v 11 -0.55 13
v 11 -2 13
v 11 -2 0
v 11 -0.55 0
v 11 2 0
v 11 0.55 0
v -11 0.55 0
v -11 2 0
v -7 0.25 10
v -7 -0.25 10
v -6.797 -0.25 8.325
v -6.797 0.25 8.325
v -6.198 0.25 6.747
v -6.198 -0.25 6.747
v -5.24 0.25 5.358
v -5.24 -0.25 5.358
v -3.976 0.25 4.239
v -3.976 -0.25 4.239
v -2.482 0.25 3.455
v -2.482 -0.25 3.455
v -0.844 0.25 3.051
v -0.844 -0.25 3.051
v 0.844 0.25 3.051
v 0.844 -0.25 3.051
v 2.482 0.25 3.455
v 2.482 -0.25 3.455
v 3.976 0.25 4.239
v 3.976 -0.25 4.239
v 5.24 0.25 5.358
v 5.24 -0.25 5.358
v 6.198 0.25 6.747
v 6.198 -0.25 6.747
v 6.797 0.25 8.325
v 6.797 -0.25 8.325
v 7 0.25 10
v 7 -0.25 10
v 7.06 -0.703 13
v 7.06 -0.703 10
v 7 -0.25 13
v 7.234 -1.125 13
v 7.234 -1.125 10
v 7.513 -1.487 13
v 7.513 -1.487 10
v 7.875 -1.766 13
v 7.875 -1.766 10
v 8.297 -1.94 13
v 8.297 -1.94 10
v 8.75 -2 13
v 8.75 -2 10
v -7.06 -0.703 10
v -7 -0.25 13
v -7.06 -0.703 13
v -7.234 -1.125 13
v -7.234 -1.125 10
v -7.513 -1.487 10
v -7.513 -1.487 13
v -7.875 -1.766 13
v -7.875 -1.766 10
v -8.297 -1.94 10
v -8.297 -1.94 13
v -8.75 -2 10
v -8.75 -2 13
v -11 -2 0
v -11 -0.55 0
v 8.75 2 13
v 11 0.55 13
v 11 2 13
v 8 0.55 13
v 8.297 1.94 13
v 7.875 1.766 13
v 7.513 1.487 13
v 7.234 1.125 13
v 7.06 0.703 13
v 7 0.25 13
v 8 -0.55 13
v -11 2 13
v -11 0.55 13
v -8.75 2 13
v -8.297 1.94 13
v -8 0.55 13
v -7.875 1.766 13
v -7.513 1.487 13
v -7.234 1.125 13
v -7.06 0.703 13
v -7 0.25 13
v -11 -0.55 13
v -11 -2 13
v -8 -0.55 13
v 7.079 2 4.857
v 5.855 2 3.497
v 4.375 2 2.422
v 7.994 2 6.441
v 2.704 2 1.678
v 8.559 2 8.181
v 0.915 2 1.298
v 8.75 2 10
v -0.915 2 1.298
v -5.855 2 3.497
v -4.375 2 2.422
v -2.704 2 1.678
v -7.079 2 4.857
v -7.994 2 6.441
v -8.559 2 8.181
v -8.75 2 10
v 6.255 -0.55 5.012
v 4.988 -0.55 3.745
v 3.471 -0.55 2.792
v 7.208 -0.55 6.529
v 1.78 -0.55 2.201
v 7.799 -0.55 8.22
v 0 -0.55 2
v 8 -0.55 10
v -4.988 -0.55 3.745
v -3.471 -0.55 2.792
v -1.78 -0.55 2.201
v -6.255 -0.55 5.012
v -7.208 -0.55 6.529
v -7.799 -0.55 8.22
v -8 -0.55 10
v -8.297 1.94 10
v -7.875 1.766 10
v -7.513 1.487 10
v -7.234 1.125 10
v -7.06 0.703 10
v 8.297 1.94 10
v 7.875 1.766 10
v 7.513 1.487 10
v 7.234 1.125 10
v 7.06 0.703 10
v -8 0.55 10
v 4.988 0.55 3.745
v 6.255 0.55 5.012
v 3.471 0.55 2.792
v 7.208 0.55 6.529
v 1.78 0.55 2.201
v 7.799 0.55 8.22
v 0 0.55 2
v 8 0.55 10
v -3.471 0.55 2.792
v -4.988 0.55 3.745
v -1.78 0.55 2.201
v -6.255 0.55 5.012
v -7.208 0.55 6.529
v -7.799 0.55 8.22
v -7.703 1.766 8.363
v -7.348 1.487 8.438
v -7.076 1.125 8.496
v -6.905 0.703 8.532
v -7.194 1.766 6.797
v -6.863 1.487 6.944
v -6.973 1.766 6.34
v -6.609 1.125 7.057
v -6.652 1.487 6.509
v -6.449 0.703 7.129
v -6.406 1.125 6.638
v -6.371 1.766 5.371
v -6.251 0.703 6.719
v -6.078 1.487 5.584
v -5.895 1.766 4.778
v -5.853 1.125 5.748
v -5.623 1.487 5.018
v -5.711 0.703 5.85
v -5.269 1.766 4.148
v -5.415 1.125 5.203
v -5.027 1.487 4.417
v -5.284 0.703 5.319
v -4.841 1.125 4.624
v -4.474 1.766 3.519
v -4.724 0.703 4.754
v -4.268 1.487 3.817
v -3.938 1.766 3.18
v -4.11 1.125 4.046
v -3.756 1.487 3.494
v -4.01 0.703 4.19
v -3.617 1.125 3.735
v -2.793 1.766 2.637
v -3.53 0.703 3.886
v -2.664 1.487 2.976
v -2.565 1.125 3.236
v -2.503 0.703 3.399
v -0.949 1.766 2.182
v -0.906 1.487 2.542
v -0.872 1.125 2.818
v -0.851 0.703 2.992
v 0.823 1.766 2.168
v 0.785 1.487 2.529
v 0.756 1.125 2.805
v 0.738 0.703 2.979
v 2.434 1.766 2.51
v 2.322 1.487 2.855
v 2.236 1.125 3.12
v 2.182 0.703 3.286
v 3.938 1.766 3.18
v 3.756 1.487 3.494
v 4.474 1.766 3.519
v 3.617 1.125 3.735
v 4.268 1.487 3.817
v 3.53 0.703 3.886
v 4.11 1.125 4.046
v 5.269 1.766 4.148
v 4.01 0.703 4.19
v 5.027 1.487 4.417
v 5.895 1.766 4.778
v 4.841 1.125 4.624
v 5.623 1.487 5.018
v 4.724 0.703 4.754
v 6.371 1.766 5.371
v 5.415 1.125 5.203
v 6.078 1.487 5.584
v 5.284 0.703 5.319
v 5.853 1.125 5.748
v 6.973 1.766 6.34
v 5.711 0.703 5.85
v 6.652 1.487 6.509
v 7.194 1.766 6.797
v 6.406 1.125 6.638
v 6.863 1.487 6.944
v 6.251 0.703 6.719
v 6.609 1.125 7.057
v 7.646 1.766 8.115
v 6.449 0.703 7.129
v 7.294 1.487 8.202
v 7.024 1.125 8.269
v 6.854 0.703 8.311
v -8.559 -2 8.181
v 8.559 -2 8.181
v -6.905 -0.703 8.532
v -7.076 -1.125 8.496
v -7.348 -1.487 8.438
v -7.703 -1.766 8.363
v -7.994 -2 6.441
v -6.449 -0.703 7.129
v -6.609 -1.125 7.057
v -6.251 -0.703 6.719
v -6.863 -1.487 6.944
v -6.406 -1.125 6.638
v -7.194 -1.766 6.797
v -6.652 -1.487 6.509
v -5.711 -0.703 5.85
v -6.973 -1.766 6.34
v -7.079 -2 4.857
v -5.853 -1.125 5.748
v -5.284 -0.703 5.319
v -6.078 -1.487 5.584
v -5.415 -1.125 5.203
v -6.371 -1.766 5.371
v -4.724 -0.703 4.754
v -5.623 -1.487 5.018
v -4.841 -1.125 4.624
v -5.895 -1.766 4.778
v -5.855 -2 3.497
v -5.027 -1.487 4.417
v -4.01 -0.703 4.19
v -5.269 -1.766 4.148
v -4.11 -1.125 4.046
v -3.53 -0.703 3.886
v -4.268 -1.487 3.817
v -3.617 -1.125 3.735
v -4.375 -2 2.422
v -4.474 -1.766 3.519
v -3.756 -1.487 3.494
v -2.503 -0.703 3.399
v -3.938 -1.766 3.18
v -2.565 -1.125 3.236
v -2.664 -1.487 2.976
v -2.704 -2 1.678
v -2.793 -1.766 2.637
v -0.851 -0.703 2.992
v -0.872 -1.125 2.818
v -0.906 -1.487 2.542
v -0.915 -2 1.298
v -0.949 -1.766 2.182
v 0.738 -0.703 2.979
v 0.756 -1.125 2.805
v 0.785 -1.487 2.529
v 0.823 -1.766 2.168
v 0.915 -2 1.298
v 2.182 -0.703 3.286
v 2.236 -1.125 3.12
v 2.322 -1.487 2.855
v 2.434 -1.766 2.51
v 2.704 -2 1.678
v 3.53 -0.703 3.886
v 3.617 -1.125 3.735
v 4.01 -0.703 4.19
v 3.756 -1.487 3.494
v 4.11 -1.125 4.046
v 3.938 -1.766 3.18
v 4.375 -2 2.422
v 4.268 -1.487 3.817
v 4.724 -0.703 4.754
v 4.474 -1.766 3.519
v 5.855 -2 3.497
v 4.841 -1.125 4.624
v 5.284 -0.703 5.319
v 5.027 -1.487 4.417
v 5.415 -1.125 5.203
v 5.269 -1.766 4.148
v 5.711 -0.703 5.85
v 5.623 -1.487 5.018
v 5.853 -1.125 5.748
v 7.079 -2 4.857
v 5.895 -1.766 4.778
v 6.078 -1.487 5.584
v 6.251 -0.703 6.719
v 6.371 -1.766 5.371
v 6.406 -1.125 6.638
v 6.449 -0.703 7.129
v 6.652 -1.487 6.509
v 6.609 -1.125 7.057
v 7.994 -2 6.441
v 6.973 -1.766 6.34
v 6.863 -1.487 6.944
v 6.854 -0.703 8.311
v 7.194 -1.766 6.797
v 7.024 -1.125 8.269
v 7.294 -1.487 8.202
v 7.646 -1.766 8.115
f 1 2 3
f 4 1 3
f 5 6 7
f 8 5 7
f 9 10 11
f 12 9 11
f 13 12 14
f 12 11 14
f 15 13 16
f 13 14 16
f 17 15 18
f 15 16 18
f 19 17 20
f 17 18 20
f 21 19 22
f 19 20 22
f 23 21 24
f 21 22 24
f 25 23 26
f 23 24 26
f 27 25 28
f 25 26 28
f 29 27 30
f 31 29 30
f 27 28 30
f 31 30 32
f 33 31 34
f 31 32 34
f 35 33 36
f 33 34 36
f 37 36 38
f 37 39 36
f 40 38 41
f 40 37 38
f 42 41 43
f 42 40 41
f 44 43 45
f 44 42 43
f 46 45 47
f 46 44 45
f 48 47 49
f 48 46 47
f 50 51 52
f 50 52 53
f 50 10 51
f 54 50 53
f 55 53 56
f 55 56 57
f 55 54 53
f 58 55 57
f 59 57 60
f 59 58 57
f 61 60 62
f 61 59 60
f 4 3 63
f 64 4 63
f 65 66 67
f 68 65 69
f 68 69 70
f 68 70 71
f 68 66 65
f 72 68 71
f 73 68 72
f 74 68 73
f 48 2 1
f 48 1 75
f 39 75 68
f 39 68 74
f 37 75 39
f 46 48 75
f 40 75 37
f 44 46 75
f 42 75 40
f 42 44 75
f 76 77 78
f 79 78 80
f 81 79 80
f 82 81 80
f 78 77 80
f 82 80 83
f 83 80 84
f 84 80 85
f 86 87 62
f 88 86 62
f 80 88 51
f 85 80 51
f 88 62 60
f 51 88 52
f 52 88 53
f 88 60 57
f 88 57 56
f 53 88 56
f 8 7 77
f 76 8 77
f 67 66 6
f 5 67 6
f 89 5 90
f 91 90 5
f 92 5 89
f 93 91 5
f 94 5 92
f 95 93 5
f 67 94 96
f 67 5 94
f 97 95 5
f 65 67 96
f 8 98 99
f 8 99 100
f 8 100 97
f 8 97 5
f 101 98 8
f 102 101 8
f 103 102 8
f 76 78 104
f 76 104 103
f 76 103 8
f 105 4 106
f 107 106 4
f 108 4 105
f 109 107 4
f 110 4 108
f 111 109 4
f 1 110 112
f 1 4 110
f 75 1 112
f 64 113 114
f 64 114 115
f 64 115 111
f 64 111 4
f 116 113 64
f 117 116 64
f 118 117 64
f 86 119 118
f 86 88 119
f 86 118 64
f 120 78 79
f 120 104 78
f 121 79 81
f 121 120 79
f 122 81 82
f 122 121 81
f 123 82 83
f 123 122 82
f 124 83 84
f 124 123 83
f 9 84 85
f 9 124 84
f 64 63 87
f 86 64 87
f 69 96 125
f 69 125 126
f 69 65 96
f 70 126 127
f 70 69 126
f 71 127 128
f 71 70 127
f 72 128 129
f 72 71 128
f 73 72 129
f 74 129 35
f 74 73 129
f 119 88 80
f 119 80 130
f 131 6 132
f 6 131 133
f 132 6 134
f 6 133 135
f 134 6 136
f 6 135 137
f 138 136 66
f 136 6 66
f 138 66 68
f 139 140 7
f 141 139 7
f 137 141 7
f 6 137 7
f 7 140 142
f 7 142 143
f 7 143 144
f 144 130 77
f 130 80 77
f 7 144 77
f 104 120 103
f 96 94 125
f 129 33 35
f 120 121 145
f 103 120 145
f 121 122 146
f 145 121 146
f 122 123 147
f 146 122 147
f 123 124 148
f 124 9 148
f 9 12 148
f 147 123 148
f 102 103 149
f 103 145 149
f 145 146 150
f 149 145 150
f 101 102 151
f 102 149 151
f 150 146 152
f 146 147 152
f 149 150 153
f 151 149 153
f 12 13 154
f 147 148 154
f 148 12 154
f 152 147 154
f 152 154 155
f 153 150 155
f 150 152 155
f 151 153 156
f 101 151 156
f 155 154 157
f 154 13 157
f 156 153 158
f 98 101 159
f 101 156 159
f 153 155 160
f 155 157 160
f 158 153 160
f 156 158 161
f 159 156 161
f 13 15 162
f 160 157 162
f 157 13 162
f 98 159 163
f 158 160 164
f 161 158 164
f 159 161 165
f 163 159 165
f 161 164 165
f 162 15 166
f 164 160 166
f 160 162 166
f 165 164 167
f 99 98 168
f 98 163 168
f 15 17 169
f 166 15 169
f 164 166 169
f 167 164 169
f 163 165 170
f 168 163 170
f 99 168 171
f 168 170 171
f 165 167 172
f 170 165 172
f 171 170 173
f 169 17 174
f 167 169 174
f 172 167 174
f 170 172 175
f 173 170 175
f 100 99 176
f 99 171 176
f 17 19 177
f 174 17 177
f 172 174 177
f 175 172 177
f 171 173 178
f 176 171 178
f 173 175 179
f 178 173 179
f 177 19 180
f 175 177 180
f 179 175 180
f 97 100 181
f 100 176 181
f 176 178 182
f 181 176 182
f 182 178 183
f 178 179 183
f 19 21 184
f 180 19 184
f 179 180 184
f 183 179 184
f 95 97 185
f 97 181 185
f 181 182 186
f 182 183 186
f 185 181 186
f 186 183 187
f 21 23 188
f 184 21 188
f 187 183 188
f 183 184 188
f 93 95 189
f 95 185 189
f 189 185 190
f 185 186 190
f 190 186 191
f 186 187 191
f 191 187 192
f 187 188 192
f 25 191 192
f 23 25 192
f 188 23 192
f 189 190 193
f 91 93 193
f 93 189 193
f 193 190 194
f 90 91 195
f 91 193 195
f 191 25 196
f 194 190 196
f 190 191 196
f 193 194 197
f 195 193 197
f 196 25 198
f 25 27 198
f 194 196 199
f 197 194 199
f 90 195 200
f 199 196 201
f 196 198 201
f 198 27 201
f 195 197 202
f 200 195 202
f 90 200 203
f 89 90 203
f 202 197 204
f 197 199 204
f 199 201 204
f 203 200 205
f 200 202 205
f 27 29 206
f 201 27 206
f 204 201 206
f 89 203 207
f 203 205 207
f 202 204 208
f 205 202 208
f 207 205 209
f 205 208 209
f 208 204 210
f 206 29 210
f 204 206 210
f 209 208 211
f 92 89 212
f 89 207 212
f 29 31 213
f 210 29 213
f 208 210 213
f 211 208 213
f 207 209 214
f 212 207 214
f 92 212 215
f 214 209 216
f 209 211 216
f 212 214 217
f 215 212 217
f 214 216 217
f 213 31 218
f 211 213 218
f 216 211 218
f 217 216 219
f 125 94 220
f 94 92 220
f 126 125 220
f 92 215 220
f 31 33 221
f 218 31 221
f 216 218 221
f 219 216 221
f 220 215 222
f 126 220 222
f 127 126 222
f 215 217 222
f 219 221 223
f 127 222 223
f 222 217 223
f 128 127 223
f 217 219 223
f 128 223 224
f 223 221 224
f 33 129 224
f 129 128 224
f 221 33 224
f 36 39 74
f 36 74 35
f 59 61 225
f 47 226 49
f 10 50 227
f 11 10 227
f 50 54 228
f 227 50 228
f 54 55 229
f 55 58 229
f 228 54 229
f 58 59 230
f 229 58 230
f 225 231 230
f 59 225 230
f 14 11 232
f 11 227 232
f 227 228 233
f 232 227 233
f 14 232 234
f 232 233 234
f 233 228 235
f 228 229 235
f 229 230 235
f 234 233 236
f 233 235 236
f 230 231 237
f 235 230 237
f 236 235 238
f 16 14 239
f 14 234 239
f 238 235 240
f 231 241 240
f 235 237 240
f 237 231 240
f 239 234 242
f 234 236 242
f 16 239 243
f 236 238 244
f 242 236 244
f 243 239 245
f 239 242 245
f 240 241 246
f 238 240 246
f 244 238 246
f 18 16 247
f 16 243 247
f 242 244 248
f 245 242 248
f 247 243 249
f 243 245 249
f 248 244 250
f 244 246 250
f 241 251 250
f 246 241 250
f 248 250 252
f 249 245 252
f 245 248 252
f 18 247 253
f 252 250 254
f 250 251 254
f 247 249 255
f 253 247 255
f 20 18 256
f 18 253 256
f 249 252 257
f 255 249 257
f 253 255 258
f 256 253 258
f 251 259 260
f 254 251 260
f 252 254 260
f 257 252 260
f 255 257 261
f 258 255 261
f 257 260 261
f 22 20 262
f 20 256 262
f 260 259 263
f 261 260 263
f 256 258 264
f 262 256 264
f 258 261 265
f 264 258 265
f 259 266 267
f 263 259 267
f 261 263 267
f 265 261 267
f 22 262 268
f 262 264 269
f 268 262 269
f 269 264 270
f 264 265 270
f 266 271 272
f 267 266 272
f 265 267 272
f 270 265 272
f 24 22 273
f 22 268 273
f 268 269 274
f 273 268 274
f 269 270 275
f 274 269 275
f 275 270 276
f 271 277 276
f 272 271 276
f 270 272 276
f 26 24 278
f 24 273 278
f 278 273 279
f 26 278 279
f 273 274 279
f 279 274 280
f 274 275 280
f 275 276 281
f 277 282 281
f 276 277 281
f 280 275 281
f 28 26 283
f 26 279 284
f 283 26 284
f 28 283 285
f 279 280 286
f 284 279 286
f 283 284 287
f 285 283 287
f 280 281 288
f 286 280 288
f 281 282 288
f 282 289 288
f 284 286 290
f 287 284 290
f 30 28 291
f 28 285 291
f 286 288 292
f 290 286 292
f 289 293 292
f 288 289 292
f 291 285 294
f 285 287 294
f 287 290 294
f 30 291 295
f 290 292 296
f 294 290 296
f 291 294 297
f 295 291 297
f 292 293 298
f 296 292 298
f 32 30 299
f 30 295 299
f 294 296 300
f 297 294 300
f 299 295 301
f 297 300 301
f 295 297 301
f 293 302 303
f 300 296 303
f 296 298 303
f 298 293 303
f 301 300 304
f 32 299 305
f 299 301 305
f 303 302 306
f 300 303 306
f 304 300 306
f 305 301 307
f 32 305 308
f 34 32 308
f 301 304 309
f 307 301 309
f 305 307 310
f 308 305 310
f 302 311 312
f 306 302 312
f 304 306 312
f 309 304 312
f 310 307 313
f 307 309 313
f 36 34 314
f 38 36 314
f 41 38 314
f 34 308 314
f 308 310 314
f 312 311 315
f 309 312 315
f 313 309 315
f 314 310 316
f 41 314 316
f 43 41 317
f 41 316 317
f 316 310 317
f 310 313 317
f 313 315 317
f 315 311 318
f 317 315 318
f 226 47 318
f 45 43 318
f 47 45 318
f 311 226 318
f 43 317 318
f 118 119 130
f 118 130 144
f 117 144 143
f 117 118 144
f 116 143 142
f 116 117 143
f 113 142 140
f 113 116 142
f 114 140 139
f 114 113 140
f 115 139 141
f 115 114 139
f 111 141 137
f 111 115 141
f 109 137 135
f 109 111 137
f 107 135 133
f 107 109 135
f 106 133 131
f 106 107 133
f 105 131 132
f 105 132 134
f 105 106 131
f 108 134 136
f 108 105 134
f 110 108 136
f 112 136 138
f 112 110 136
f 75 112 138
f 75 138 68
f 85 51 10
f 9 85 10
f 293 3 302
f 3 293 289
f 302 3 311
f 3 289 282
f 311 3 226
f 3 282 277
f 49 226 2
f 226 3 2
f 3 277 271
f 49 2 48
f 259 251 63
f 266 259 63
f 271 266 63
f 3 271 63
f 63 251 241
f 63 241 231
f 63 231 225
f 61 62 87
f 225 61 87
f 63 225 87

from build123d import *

# Parameters (mm, degrees)
PAD_DEPTH    = 2
POCKET_DEPTH = 0.55
FILLET_R     = 1.75


with BuildPart() as part:
    # Sketch → Pad (new body, symmetric)
    with BuildSketch(Plane.XZ):
        with BuildLine():
            Line((11, 0), (-11, 0))
            Line((-11, 0), (-11, 13))
            Line((-11, 13), (-7, 13))
            Line((-7, 13), (-7, 10))
            ThreePointArc((-7, 10), (0, 3), (7, 10))
            Line((7, 13), (7, 10))
            Line((11, 13), (7, 13))
            Line((11, 13), (11, 0))
        make_face()
    extrude(amount=PAD_DEPTH, both=True)

    # Sketch001 → Pocket (cut, symmetric)
    with BuildSketch(Plane.XZ):
        with BuildLine():
            Line((8, 10), (8, 16))
            Line((8, 16), (12, 16))
            Line((12, 16), (12, 0))
            Line((12, 0), (-12, 0))
            Line((-12, 0), (-12, 16))
            Line((-12, 16), (-8, 16))
            Line((-8, 16), (-8, 10))
            ThreePointArc((-8, 10), (0, 2), (8, 10))
        make_face()
    extrude(amount=POCKET_DEPTH, both=True, mode=Mode.SUBTRACT)

    # Fillet
    fillet_edges = [part.edges().sort_by_distance(p)[0] for p in [
        (0, 2, 3),
        (0, -2, 3),
    ]]
    fillet(fillet_edges, radius=FILLET_R)


solid = part.part
